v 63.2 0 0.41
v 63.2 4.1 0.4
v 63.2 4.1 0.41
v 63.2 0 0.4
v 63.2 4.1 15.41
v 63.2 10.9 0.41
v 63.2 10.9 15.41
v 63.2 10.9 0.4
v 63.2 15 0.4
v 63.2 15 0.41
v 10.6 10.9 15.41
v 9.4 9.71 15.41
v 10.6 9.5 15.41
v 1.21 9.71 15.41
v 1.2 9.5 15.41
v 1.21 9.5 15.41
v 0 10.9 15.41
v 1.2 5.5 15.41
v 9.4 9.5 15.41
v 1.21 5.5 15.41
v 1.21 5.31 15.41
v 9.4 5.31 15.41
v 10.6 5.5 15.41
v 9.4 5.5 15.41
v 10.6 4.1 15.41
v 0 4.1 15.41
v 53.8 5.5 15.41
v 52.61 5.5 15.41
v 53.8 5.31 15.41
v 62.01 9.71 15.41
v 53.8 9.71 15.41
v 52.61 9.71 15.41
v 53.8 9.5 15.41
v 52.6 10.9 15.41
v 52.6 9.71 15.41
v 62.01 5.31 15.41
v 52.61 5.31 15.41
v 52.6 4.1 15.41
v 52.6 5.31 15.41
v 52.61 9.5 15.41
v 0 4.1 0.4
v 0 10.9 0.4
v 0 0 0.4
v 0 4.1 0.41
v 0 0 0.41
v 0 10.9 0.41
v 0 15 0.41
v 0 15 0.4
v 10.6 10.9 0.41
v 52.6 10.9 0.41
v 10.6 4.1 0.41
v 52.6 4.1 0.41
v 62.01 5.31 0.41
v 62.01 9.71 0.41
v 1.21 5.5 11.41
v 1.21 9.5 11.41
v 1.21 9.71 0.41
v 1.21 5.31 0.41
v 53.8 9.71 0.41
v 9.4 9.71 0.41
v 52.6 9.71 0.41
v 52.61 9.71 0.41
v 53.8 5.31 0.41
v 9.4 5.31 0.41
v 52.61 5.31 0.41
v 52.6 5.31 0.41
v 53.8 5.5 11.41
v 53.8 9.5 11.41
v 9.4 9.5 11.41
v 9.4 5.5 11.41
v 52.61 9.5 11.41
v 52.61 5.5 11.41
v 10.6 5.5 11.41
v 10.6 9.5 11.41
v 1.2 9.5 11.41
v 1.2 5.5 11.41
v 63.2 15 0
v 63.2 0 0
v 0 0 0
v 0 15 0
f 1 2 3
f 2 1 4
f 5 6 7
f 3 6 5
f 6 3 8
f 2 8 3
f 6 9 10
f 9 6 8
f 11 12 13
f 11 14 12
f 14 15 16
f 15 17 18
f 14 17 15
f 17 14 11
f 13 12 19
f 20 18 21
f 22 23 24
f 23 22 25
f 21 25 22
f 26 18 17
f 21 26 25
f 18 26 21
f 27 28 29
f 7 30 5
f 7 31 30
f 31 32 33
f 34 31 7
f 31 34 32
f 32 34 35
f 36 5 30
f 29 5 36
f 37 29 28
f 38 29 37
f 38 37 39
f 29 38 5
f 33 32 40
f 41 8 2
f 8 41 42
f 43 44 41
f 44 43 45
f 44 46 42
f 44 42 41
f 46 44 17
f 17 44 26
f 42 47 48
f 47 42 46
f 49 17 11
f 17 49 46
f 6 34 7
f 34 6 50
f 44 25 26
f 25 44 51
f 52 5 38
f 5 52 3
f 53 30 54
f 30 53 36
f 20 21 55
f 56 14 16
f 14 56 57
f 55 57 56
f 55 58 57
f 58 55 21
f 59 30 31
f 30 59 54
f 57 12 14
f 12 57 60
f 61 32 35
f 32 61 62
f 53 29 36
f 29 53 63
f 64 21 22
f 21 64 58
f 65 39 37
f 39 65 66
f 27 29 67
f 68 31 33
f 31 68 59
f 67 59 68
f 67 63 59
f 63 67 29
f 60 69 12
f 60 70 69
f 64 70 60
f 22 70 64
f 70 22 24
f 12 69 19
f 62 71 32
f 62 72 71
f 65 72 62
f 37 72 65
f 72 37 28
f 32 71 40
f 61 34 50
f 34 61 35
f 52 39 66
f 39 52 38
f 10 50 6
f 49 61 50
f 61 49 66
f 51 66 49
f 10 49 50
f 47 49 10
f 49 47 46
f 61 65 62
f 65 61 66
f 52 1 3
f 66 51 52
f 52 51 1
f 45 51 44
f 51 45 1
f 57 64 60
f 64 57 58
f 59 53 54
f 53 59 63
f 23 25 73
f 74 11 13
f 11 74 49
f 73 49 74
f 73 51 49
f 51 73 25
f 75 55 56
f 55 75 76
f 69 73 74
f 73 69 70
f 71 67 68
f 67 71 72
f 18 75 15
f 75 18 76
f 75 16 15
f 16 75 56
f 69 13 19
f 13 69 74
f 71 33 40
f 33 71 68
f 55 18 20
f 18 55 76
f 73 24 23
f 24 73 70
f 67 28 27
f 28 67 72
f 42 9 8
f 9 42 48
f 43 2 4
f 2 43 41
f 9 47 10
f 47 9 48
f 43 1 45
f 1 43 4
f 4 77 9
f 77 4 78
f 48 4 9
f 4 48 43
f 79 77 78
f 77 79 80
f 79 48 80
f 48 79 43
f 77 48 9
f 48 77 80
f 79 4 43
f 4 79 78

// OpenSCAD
// file: ../../Base/PlacementOptions.scad
// Fischertechnik Box Foundation
// Placement Options

// Alignment
NoAlign = 0;
AlignLeft = 1;
AlignBottom = 2;
AlignCenter = 3;
AlignRight = 4;
AlignTop = 5;

// Element rotation degree steps
rotations = [0, -90, -180, -270];

// Rotation
NoRotation = 0;
Rotate0 = 0;
Rotate90 = 1;
Rotate180 = 2;
Rotate270 = 3;

// Docking (seen from above)
NoDock = -1;
DockLeft = 0;
DockTop = 1;
DockRight = 2;
DockCorner = 2;
DockBottom = 3;

// Web corners
LowerLeft = 0;
UpperLeft = 1;
UpperRight = 2;
LowerRight = 3;

// Web position relative to corner
LeftOfCorner = 0;
RightOfCorner = 1;
// file: ../../Base/Boxes.scad
// Fischertechnik Box Foundation
// Pre-designed Boxes

use <Constants.scad>

include <PlacementOptions.scad>

box190Width = 190;
box190Depth = 130;
box130Width = 130;
box130Depth = 95;

// Values are from an original ec3 box
topBottomDifference = 1.5;
outerHeight = 40;
baseThickness = 1.8;
innerHeight = outerHeight - baseThickness;
stackExcess = 5.7;
radius = 3.5;
wallThickness = 1.5;
tolerance = 0.2;

boxWallThickness = wallThickness;
boxBaseThickness = baseThickness;
boxWebWidth = 3.0;

// getBoxWallThickness()
// Gets the wall thickness of a Fischertechnik Box
function getBoxWallThickness() = boxWallThickness;

// getBoxUsageHeight(height = 38.2)
// Gets the usable height of a Fischertechnik box
// height = Outer height of the box from the bottom to the upper edge.
function getBoxUsageHeight(height = outerHeight) = height - baseThickness - stackExcess;

// getBoxInnerHeight()
// Gets the inner height of a Fischertechnik box, including the stack excess
function getBoxInnerHeight() = innerHeight;

// getBoxBaseThickness()
// Gets the thickness of the Fischertechnik box base.
function getBoxBaseThickness() = boxBaseThickness;

// getBoxWebWidth()
// Gets the width of a box web
function getBoxWebWidth() = boxWebWidth;

// getBox190Space()
// Gets the usable inner space of a Box 190 as an x/y-list
function getBox190Space() = [
    box190Width - 2*getBoxWallThickness() - topBottomDifference, 
    box190Depth - 2*getBoxWallThickness() - topBottomDifference ];

// RoundedCornerPlate(width, depth, height, radius)
// Creates a body plate with rounded corners for a box. Used
// also to create the complete box with the hull module.
// width = Width of the plate
// depth = depth of the plate 
// height = thickness of the plate
// radius = radius of the rounded corner
module RoundedCornerPlate(width, depth, height, radius) {
    translate([radius, radius])
    hull() {
        w = width-2*radius;
        d = depth-2*radius;
        cube([w, d, height]);
        cylinder(height, r=radius, $fn=getFragments());
        translate([w, 0])
            cylinder(height, r=radius, $fn=getFragments());
        translate([w, d])
            cylinder(height, r=radius, $fn=getFragments());
        translate([0, d])
            cylinder(height, r=radius, $fn=getFragments());
    }
}

// BoxBase(width, depth)
// Creates an empty stackable Fischertechnik compatible box
// width = Outer width of the box (190, 130, ...)
// depth = Outer depth of the box (130, 95, ...)

module BoxBase(width, depth, height=outerHeight) {    
    thinPlate = 0.01;

    innerHeight = height - baseThickness;    
    
    module Body(tolerance=tolerance) {
        hull() {
            // Bottom with tolerance to fit into the original boxes when stacked
            translate([-wallThickness+tolerance, -wallThickness+tolerance, -baseThickness])
                RoundedCornerPlate(width-topBottomDifference-2*tolerance, depth-topBottomDifference-2*tolerance, thinPlate, radius);
            
            // Top
            translate([-wallThickness-topBottomDifference/2, -wallThickness-topBottomDifference/2, innerHeight-thinPlate])
                RoundedCornerPlate(width, depth, thinPlate, radius);
         }
    }

    module Cutoff() {
        hull() {
            coWidth = width - 2*wallThickness;
            coDepth = depth - 2*wallThickness;
            
            // Bottom
            RoundedCornerPlate(coWidth-topBottomDifference, coDepth-topBottomDifference, thinPlate, radius);

            // Top
            translate([-topBottomDifference/2, -topBottomDifference/2, innerHeight+thinPlate]) 
                RoundedCornerPlate(coWidth, coDepth, thinPlate, radius);
        }
    }
    
    difference() {        
        Body();
        Cutoff();
        stackOffset = innerHeight - stackExcess;
        translate([0, 0, stackOffset + baseThickness])
            Body(tolerance=0);
    }
}

// Creates the Fischertechnik empty box 130x190 mm and places it at position 0,0
// 190x130 are the outer sizes, the inner space is slightly smaller. Use getBox190Space() to get the inner sizes.
// The box is positioned that the usable inner space is at the 0,0,0 position.

module Box190() {
    BoxBase(box190Width, box190Depth);
}

// Gets the usable inner space of a Box 130 as an x/y-list
function getBox130Space() = [
    box130Width - 2*getBoxWallThickness() - topBottomDifference, 
    box130Depth - 2*getBoxWallThickness() - topBottomDifference ];

// Creates the Fischertechnik empty box 95x130 mm and places it at position 0,0
// 190x130 are the outer sizes, the inner space is slightly smaller. Use getBox190Space() to get the inner sizes.
// The box is positioned that the usable inner space is at the 0,0,0 position.

module Box130() {
    BoxBase(box130Width, box130Depth);
}

// Creates a web at the specified box walls
// corner 0 = LowerLeft, 1 = UpperLeft, 2 = UpperRight, 3 = LowerRight
// side 0 = LeftOfCorner, 1 = RightOfCorner
// distance = Distance in mm from the corner
// boxSpace = inner width and depth of the box (default: Box 190)
// webWidth = length of the web (default is 3 mms)
// webThickness = thickness of the web (default is 1 mm)
// height = Height of the web (standard is getBoxUsageHeight())

module BoxWeb(corner, side, distance, boxSpace=getBox190Space(), webWidth=getBoxWebWidth(), webThickness=1.0, height=getBoxUsageHeight()) {
    sink = getBoxWallThickness()/2;

    width = (corner % 2 == 0) ? 
            (side == LeftOfCorner ? webWidth : webThickness) :
            (side == LeftOfCorner ? webThickness : webWidth);

    depth = (corner % 2 == 0) ? 
            (side == RightOfCorner ? webWidth : webThickness) :
            (side == RightOfCorner ? webThickness : webWidth);
    
    xDiff = corner == LowerLeft ? 
                (side == LeftOfCorner ? -sink : distance) :
            (corner == UpperLeft ?                
                (side == LeftOfCorner ? distance : -sink) :
            (corner == UpperRight ?
                (side == LeftOfCorner ? boxSpace.x-webWidth+sink : boxSpace.x-distance-webThickness) :
                (side == LeftOfCorner ? boxSpace.x-distance-webThickness: boxSpace.x-webWidth+sink)));

    yDiff = corner == LowerLeft ? 
                (side == RightOfCorner ? -sink : distance) :
            (corner == UpperLeft ?
                (side == RightOfCorner ? boxSpace.y-distance-webThickness : boxSpace.y-webWidth+sink) :
            (corner == UpperRight ?
                (side == RightOfCorner ? boxSpace.y-webWidth+sink : boxSpace.y-distance-webThickness) :
                (side == RightOfCorner ? distance : -sink)));
    
    translate([xDiff, yDiff, -getExcess()])
        cube([width, depth, height + 2*getExcess()]);
}
// file: ../../Base/Rotation.scad
// Fischertechnik Box Foundation
// Geometry Helpers Rotation

include <PlacementOptions.scad>

// getRotatedSpace(space, rotation=NoRotation)
// Rotates the space dependent on the specified rotation

function getRotatedSpace(space, rotation=NoRotation) = [
    (rotation == Rotate90 || rotation == Rotate270) ? space.y : space.x,
    (rotation == Rotate90 || rotation == Rotate270) ? space.x : space.y
];

// Rotates the given space around the fixed left lower corner
// space = the space the children needs as width/depth list [width,depth]
// rotation = 0 Rotate0 degrees, 1 Rotate90 degrees, 2 Rotate180 degrees, 3 Rotate270 degrees (equivalent to -90)

module RotateFix(space, rotation=NoRotation) {
    dy = (rotation == Rotate0 || rotation == Rotate270) ? 0 :
        (rotation == Rotate90) ? space.x :
        space.y;
    dx = (rotation < Rotate180) ? 0 :
        (rotation == Rotate180) ? space.x :
        space.y;
    
    translate([dx, dy, 0])
        rotate([0, 0, rotations[rotation]])
            children();
}
// file: ../../Base/Alignment.scad
// Fischertechnik Box Foundation
// Geometry Helpers Alignment

include <PlacementOptions.scad>

// getAlignedX(elementWidth, spaceWidth, align=AlignRight, offset=0)
// Gets the aligned X offset of an element with the given
// width in the given space.
// elementWidth = The width of the element to positon
// spaceWidth = The space where the element should be aligned
// align = 0 AlignLeft, 1 AlignCenter, 2 AlignRight
// offset = an optional offset from the aligned position. When
// aligned left or centered, then positive values are in X direction.
// When aligned right then positive values are in negative X direction.

function getAlignedX(elementWidth, spaceWidth, align=AlignRight, offset=0) =
    (align == AlignLeft) ?
        offset :
        ((align == AlignCenter) ?
        (spaceWidth - elementWidth)/2 + offset :
        spaceWidth - offset - elementWidth);

// getAlignedY(elementDepth, spaceDepth, align=AlignTop, offset=0)
// Gets the aligned Y offset of an element with the given
// depth in the given space.
// elementDepth = The depth of the element to positon
// spaceDepth = The space where the element should be aligned
// align = 0 AlignBottom, 1 AlignCenter, 2 AlignTop
// offset = an optional offset from the aligned position. When
// aligned bottom or centered, then positive values are in Y direction.
// When aligned top then positive values are in negative Y direction.

function getAlignedY(elementDepth, spaceDepth, align=AlignTop, offset=0) =
    (align == AlignBottom) ?
        offset :
        ((align == AlignCenter) ?
        (spaceDepth - elementDepth)/2 + offset :
        spaceDepth - offset - elementDepth);
// file: ../../Elements/FrameAxis60.scad
// Fischertechnik Box Library
// Frame for single 60 mm Axis
// 31032

use <../ModelBase/Complex.scad>

length = 60;

// getFrameAxis60Space()
// Gets the width (.x) and depth (.y) of the axis frame.

function getFrameAxis60Space() = getFrameAxisSpace(length);

// FrameAxis60()
// Axis holder for a single 60 mm axis.

module FrameAxis60() {
    FrameAxis(length);
}

// Test
color("lightgray")
FrameAxis60();
// file: ../../Base/Placement.scad
// Fischertechnik Box Foundation
// Geometry Helpers Placement

use <Constants.scad>
use <Alignment.scad>
use <Rotation.scad>
use <Boxes.scad>

include <PlacementOptions.scad>

// Place(x=0, y=0, elementSpace=[0,0], alignX=AlignLeft, alignY=AlignBottom, rotation=Rotate0, boxSpace=getBox190Space())
// Places the child at the specified position
// y = Y-Position. This is a relative position when an X aligment is specified.
// x = X-Position. This is a relative position when an Y aligment is specified.
// elementSpace = space of the element to be placed [x,y]
// alignX = -1=NoAlign, 0 AlignLeft, 1 AlignCenter, 3 AlignRight (elementSpace and boxSpace required!)
// alignY = -1=NoAlign, 2 AlignBottom, 1 AlignCenter, 4 AlignTop (elementSpace and boxSpace required!)
// rotation = 0 Rotate0 0 degrees, 1 Rotate90 90 degrees, 
// 2 Rotate180 180 degrees, 3 Rotate270 270 degrees (equivalent to -90)
// boxSpace = Inner space of the box where the placement occurs [x,y] - default is Box 190x130 inner space

module Place(x=0, y=0, elementSpace=[0,0], 
  alignX=AlignLeft, alignY=AlignBottom, 
  rotation=NoRotation, boxSpace=getBox190Space()) {

    module Position(x, y, space, rotation=Rotate0) {
        translate([x, y, 0])
            RotateFix(space, rotation)
                children();
    }

    space = getRotatedSpace(elementSpace, rotation);
    alignedX = getAlignedX(space.x, boxSpace.x, alignX, x);
    alignedY = getAlignedY(space.y, boxSpace.y, alignY, y);
    Position(alignedX, alignedY, elementSpace, rotation)
        children();
}

// Center(space=getBox130Space(), elementSpace=[0,0])
// space = Space where the children is centered. For cylinder use centered=true and no elementSpace.
// elementSpace = space of the element to be centered [x,y]

module Center(space=getBox190Space(), elementSpace=[0,0]) {
    Place(elementSpace=elementSpace, boxSpace=space, alignX=AlignCenter, alignY=AlignCenter)
        children();
}

// CenterHorizontal(width=0, y=0, offset=0, space=getBox130Space())
// width = Width of the element to be placed.
// y = Y position of the element
// offset = Offset from the center position (negative will be left of the center)
// space = Space where the element is placed

module CenterHorizontal(width=0, y=0, offset=0, space=getBox190Space()) {
    Place(x=offset, y=y, elementSpace=[width, 0], boxSpace=space, alignX=AlignCenter)
        children(0);
}

// CenterVertical(depth=0, x=0, offset=0, space=getBox130Space())
// depth = Depth of the element to be placed.
// x = X position of the element
// offset = Offset from the center position (negative will be down of the center)
// space = Space where the element is placed

module CenterVertical(depth=0, x=0, offset=0, space=getBox190Space()) {
    Place(x=x, y=offset, elementSpace=[0, depth], boxSpace=space, alignY=AlignCenter)
        children(0);
}

// getIsVertical(align)
// True if the specified alignment needs a vertical orientation for a divider (AlignRight, AlignLeft)

function getIsVertical(align) = (align == AlignRight || align == AlignLeft);

// getIsHorizontal(align)
// True if the specified alignment needs a horizontal orientation for a divider (AlignTop, AlignBottom)

function getIsHorizontal(align) = (align == AlignTop || align == AlignBottom);
// file: ../../Elements/AxisClip10.scad
// Fischertechnik Box Library
// Axis for clip 10
// 31023

use <../ModelBase/Simple.scad>
use <../Base/Constants.scad>

/* [Element Parameters] */
height = 23;
clipHeight = 10;

/* [Hidden] */
width = 12;
depth = 12;
upperDiameter = 3.6;

// getAxisClip10Space()
// Gets the space of a n axis for a clip 10 with spring ring (mot2)

function getAxisClip10Space() = [width, depth, height];

// AxisClip10(height, clipHeight)
// Axis for clip 10 with spring ring (mot2)
// height = Height of the complete axis (standard is 23, in mot3 its only 12)
// clipHeight = Height of the part for the clip (standard is 10, in mot3 its only 7)

module AxisClip10(height=height, clipHeight=clipHeight) {
    LeveledAxisWithSpace(height, height-clipHeight, getAxisClip10Space(), diameter=upperDiameter);
}

// Test
color("lightgray")
AxisClip10(height, clipHeight);
// file: ../../Base/Constants.scad
// Fischertechnik Box Foundation
// Constants

// Constant values necessary for multiple elements

// Base constants
dividerThickness = 1.2;
excess = 0.01;
fragments = 90;
tolerance = 0.8;

// Gets the thickness of a divider 
function getDividerThickness() = dividerThickness;

// Gets the excess that is used to merge walls into each other
function getExcess() = excess;

// Gets amount of fragments of a cylinder
function getFragments() = fragments;

// Gets the inner tolerance of a frame to each side
function getTolerance() = tolerance;


// Fischertechnik specific constants
axisDiameter = 4;
axisBottomDiameter = axisDiameter + 1;
axisTolerance = 0.2;

// Gets axis diameter of Fischertechnik axis
function getAxisDiameter() = axisDiameter;

// Gets axis diameter tolerance (subtracted for element axis)
function getAxisTolerance() = axisTolerance;

// Gets the axis diameter for standing axis
function getStandAxisDiameter() = getAxisDiameter() - getAxisTolerance();

// Gets axis bottom diameter for thicker part at the bottom
function getAxisBottomDiameter() = axisBottomDiameter;

standardEdgeDistance = 2.5;
standardWebDistance = 11.5;
standardCornerLength = 15;

// gets the standard distance to the wall of the box for dockable frames with webs
function getStandardEdgeDistance() = standardEdgeDistance;

// gets the standard distance of each web to the corner of the dockable frame
function getStandardWebDistance() = standardWebDistance;

// gets the standard length of the corner walls of a dockable frame
function getStandardCornerLength() = standardCornerLength;

tubeWallFactor = 0.8;

// gets the wall thickness of a tube.
function getTubeWallThickness() = tubeWallFactor * getDividerThickness();

smallPartsFrameHeight = 20;

// gets the frame height for docked small parts boxes.
function getSmallPartsFrameHeight() = smallPartsFrameHeight;

hubRingDiameter = 19.5;
hubRingLevelDiameter = 21;

// gets the diameter of a tube matching the inner ring of a wheel
function getHubRingDiameter() = hubRingDiameter;

// gets the diameter of a hub tube with a thicker diameter
function getHubRingLevelDiameter() = hubRingLevelDiameter;
// file: ../../Elements/FrameAxis60WithGearwheelZ28.scad
// Fischertechnik Box Library
// Frame for 60 mm Axis with gear wheel 28
// 31063

use <../Base/Placement.scad>
use <../ModelBase/Simple.scad>
use <FrameAxis60.scad>

/* [Hidden] */
depth = 15;

// getFrameAxis60WithGearwheelZ28Space()
// Gets the width (.x) and depth (.y) of the axis frame.

function getFrameAxis60WithGearwheelZ28Space() = 
[
    getFrameAxis60Space().x,
    depth
];

// FrameAxis60WithGearwheelZ28()
// Axis holder for a 60 mm axis with gear wheel Z28.

module FrameAxis60WithGearwheelZ28() {
    Space(getFrameAxis60WithGearwheelZ28Space());
    CenterVertical(depth=getFrameAxis60Space().y, space=getFrameAxis60WithGearwheelZ28Space())
        FrameAxis60();
}

// Test
color("lightgray")
FrameAxis60WithGearwheelZ28();
// file: ../TestPrint.scad
// 3D Print Test Base

use <../Base/Constants.scad>

use <../Elements/AxisClip10.scad>

module TestPrint(elementSpace) {
    cube([elementSpace.x, elementSpace.y, 0.4]);
    translate([0,0,0.4+getExcess()]) {
        children();
    }
}

TestPrint(getAxisClip10Space())
    AxisClip10();
// main file
// 3D Print Test
// FrameAxis60WithGearwheelZ28

use <../TestPrint.scad>
use <../../Elements/FrameAxis60WithGearwheelZ28.scad>

TestPrint(getFrameAxis60WithGearwheelZ28Space())
    FrameAxis60WithGearwheelZ28();
